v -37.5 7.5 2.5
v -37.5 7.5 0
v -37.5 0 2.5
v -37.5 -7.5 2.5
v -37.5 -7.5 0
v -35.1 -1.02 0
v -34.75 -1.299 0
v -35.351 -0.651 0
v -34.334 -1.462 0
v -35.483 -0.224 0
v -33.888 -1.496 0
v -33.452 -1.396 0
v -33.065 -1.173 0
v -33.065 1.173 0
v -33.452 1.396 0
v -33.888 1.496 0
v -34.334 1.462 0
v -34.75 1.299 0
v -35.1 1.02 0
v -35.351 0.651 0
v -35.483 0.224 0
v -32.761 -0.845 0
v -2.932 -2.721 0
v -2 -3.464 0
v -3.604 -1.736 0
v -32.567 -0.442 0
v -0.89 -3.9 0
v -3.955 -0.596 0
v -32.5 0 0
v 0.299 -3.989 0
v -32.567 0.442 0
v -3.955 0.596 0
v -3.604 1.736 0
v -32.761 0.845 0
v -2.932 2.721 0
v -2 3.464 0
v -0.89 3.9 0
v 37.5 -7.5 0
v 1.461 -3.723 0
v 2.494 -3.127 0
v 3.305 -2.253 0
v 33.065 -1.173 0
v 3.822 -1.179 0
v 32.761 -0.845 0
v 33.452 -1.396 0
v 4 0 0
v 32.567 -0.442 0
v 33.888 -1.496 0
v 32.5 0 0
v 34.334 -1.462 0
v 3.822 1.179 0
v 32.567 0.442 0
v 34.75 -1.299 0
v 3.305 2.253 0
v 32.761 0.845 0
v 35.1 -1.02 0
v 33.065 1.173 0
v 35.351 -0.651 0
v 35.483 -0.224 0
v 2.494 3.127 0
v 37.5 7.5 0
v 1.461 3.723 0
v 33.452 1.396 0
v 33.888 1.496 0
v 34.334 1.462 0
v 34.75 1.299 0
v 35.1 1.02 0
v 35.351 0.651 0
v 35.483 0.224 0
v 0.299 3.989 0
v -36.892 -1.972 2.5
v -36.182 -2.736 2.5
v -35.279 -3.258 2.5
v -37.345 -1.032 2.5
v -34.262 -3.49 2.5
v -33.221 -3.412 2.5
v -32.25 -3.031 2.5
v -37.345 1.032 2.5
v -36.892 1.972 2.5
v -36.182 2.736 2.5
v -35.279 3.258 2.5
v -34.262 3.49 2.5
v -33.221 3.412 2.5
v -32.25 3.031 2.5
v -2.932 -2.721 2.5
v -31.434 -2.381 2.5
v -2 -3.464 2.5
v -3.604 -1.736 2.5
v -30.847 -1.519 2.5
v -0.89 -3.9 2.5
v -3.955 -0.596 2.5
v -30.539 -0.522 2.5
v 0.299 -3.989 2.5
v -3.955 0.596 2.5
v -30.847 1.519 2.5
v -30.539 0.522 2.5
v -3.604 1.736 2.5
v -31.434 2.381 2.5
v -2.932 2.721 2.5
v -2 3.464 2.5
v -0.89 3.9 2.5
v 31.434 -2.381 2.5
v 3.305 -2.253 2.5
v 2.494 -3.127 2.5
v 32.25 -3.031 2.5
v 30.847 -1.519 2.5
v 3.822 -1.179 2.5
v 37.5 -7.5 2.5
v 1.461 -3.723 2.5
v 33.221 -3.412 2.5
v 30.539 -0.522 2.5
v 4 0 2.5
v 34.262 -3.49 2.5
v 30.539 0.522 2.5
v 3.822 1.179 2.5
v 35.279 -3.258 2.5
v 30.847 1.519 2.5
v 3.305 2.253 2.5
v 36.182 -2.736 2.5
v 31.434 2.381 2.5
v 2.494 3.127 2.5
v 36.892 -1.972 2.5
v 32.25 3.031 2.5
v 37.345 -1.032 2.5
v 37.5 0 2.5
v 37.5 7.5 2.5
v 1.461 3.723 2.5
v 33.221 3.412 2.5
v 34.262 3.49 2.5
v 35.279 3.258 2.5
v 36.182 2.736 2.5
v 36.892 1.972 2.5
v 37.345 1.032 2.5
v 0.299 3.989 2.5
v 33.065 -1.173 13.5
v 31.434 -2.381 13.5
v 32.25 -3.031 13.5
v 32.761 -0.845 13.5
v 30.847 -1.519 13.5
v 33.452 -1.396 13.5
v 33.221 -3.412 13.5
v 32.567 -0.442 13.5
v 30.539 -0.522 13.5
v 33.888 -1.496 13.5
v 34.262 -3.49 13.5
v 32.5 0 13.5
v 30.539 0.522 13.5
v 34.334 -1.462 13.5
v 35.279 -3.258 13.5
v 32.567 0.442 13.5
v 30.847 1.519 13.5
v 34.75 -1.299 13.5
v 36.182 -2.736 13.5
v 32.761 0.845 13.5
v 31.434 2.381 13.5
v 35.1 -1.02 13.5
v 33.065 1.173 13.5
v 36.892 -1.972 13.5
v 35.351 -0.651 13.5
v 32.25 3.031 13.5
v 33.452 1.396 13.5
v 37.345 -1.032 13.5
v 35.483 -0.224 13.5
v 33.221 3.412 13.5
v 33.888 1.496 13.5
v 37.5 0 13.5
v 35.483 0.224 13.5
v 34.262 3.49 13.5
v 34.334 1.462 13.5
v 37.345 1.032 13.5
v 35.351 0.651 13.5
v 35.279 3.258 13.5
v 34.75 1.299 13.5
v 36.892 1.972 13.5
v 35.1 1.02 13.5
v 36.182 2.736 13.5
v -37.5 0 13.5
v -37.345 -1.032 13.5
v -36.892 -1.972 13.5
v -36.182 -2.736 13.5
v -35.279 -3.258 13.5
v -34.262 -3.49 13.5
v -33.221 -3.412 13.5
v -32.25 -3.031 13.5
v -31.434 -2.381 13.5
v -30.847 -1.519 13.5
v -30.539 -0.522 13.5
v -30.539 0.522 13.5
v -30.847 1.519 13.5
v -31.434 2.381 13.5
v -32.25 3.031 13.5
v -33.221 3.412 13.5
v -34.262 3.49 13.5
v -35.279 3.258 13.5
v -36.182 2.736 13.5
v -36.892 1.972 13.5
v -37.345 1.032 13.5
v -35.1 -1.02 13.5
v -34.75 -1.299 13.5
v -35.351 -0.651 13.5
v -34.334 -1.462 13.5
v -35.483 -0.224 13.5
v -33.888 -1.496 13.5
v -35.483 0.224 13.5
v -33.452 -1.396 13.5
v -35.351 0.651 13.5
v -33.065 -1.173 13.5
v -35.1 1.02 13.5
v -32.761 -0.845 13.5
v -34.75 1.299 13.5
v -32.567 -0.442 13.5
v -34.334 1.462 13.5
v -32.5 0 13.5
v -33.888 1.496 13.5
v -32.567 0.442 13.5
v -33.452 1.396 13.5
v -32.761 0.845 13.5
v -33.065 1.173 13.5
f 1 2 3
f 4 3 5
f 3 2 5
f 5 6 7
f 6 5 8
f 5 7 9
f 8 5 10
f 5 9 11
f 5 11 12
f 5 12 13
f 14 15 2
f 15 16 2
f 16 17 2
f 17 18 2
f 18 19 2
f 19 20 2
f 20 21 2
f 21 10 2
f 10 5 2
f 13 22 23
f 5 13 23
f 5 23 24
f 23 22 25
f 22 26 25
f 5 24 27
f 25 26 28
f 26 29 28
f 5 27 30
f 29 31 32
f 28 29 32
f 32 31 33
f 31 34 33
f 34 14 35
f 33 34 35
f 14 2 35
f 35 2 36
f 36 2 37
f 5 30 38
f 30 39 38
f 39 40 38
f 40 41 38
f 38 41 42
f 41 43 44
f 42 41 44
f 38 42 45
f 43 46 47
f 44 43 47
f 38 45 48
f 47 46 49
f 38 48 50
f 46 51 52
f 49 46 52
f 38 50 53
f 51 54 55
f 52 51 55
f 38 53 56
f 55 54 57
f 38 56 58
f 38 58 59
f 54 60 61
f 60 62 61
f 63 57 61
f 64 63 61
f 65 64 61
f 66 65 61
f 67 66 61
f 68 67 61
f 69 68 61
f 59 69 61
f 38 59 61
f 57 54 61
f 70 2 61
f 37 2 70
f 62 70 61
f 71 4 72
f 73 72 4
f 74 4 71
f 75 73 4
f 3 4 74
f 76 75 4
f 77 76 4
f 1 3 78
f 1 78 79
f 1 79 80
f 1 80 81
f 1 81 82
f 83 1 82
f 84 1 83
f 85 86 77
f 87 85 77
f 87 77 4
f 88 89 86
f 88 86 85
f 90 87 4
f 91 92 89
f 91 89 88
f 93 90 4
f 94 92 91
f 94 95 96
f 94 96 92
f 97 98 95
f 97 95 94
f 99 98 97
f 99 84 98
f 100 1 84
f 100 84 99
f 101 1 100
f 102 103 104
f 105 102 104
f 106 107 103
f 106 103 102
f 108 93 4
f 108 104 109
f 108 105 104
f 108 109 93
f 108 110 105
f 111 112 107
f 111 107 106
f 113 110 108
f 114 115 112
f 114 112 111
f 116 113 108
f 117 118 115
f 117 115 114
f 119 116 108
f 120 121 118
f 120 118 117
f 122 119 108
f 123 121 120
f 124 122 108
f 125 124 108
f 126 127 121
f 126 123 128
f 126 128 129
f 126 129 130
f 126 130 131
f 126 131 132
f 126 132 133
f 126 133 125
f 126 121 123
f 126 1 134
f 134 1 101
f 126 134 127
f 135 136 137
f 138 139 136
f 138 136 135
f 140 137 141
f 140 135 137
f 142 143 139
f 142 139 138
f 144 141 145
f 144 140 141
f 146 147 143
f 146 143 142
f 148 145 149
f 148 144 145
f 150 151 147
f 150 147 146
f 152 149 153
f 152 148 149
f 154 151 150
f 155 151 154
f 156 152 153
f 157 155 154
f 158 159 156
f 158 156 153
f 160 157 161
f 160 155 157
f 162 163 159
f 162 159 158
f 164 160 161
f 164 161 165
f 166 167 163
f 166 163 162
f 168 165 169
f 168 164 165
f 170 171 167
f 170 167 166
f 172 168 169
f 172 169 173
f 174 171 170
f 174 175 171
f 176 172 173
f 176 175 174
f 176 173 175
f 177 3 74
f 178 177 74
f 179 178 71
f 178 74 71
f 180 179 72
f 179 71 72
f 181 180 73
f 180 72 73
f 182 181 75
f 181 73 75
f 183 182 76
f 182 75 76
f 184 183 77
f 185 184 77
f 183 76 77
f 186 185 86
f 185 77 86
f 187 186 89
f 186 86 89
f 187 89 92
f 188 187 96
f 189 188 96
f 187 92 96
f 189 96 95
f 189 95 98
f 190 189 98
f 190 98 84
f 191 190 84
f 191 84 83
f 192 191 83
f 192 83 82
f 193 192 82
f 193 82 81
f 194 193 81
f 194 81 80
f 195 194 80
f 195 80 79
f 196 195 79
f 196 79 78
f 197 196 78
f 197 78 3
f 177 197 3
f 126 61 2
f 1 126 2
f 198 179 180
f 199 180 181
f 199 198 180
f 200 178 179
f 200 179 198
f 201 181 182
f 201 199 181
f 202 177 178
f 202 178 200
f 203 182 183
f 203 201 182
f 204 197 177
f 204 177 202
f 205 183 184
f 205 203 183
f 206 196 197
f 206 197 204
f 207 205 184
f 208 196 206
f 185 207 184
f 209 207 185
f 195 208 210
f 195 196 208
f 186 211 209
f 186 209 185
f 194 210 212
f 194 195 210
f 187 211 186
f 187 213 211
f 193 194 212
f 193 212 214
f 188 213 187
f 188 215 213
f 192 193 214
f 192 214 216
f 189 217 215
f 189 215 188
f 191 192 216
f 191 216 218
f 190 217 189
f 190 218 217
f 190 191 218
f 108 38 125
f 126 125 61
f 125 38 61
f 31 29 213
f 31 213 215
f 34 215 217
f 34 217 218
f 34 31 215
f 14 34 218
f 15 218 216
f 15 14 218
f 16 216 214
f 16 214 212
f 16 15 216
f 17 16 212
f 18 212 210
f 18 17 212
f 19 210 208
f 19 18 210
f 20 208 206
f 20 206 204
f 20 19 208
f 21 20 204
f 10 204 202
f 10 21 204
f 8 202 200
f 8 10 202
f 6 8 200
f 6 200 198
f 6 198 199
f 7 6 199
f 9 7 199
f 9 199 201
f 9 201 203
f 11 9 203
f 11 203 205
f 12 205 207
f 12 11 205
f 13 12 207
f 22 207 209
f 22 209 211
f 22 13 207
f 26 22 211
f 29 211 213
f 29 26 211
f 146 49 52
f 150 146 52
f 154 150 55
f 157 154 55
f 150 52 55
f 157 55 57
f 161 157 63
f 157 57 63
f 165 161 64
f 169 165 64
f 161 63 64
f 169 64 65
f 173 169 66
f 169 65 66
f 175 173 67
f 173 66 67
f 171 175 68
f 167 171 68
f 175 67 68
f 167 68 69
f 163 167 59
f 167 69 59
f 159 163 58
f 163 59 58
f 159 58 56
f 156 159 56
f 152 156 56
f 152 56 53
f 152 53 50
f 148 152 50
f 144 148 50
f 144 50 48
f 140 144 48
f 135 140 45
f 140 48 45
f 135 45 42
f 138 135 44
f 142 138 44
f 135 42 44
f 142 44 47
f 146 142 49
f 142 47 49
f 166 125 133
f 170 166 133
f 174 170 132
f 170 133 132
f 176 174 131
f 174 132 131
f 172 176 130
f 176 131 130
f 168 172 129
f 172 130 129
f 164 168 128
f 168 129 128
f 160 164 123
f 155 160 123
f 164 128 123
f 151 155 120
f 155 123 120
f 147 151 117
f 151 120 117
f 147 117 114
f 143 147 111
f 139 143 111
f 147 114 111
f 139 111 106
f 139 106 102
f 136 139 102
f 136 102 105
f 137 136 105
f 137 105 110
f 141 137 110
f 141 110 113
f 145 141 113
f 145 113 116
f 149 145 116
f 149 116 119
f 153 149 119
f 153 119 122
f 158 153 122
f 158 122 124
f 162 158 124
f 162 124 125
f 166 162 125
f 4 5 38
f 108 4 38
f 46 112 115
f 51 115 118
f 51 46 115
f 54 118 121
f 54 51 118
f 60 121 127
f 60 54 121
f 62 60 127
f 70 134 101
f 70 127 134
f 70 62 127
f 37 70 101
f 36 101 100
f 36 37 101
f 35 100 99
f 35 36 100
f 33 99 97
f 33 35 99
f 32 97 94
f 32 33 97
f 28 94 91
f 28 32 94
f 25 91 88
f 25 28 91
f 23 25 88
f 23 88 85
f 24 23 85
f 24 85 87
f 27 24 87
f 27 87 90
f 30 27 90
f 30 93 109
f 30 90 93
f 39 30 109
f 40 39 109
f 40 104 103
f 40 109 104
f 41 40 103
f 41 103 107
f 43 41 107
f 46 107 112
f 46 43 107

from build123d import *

# Parameters (mm, degrees)
F0_R     = 1.5
F1_DEPTH = 13.5
F2_DEPTH = 2.5
F3_DEPTH = 2.5
F4_R     = 4
F5_DEPTH = 25


with BuildPart() as f1:
    # F0 (on Top) → F1 (new body)
    with BuildSketch(Plane.XY):
        with BuildLine():
            ThreePointArc((30.5, 0), (34, -3.5), (37.5, 0))
            ThreePointArc((37.5, 0), (34, 3.5), (30.5, 0))
        make_face()
        with BuildLine():
            ThreePointArc((35.5, 0), (34, -1.5), (32.5, 0))
            ThreePointArc((32.5, 0), (34, 1.5), (35.5, 0))
        make_face(mode=Mode.SUBTRACT)
        with BuildLine():
            ThreePointArc((-30.5, 0), (-34, 3.5), (-37.5, 0))
            ThreePointArc((-37.5, 0), (-34, -3.5), (-30.5, 0))
        make_face()
        with Locations((-34, 0)):
            Circle(F0_R, mode=Mode.SUBTRACT)
    extrude(amount=F1_DEPTH)

    # F0 (on Top) → F2 (join)
    with BuildSketch(Plane.XY):
        with BuildLine():
            ThreePointArc((30.5, 0), (34, 3.5), (37.5, 0))
            Line((37.5, 0), (37.5, 7.5))
            Line((37.5, 7.5), (-37.5, 7.5))
            Line((-37.5, 7.5), (-37.5, 0))
            ThreePointArc((-37.5, 0), (-34, 3.5), (-30.5, 0))
            Line((-30.5, 0), (0, 0))
            Line((0, 0), (30.5, 0))
        make_face()
    extrude(amount=F2_DEPTH)

    # F0 (on Top) → F3 (join)
    with BuildSketch(Plane.XY):
        with BuildLine():
            Line((-37.5, -7.5), (37.5, -7.5))
            Line((37.5, -7.5), (37.5, 0))
            ThreePointArc((37.5, 0), (34, -3.5), (30.5, 0))
            Line((30.5, 0), (0, 0))
            Line((0, 0), (-30.5, 0))
            ThreePointArc((-30.5, 0), (-34, -3.5), (-37.5, 0))
            Line((-37.5, 0), (-37.5, -7.5))
        make_face()
    extrude(amount=F3_DEPTH)

    # F4 (on Top) → F5 (cut)
    with BuildSketch(Plane.XY):
        Circle(F4_R)
    extrude(amount=F5_DEPTH, mode=Mode.SUBTRACT)


solid = f1.part
